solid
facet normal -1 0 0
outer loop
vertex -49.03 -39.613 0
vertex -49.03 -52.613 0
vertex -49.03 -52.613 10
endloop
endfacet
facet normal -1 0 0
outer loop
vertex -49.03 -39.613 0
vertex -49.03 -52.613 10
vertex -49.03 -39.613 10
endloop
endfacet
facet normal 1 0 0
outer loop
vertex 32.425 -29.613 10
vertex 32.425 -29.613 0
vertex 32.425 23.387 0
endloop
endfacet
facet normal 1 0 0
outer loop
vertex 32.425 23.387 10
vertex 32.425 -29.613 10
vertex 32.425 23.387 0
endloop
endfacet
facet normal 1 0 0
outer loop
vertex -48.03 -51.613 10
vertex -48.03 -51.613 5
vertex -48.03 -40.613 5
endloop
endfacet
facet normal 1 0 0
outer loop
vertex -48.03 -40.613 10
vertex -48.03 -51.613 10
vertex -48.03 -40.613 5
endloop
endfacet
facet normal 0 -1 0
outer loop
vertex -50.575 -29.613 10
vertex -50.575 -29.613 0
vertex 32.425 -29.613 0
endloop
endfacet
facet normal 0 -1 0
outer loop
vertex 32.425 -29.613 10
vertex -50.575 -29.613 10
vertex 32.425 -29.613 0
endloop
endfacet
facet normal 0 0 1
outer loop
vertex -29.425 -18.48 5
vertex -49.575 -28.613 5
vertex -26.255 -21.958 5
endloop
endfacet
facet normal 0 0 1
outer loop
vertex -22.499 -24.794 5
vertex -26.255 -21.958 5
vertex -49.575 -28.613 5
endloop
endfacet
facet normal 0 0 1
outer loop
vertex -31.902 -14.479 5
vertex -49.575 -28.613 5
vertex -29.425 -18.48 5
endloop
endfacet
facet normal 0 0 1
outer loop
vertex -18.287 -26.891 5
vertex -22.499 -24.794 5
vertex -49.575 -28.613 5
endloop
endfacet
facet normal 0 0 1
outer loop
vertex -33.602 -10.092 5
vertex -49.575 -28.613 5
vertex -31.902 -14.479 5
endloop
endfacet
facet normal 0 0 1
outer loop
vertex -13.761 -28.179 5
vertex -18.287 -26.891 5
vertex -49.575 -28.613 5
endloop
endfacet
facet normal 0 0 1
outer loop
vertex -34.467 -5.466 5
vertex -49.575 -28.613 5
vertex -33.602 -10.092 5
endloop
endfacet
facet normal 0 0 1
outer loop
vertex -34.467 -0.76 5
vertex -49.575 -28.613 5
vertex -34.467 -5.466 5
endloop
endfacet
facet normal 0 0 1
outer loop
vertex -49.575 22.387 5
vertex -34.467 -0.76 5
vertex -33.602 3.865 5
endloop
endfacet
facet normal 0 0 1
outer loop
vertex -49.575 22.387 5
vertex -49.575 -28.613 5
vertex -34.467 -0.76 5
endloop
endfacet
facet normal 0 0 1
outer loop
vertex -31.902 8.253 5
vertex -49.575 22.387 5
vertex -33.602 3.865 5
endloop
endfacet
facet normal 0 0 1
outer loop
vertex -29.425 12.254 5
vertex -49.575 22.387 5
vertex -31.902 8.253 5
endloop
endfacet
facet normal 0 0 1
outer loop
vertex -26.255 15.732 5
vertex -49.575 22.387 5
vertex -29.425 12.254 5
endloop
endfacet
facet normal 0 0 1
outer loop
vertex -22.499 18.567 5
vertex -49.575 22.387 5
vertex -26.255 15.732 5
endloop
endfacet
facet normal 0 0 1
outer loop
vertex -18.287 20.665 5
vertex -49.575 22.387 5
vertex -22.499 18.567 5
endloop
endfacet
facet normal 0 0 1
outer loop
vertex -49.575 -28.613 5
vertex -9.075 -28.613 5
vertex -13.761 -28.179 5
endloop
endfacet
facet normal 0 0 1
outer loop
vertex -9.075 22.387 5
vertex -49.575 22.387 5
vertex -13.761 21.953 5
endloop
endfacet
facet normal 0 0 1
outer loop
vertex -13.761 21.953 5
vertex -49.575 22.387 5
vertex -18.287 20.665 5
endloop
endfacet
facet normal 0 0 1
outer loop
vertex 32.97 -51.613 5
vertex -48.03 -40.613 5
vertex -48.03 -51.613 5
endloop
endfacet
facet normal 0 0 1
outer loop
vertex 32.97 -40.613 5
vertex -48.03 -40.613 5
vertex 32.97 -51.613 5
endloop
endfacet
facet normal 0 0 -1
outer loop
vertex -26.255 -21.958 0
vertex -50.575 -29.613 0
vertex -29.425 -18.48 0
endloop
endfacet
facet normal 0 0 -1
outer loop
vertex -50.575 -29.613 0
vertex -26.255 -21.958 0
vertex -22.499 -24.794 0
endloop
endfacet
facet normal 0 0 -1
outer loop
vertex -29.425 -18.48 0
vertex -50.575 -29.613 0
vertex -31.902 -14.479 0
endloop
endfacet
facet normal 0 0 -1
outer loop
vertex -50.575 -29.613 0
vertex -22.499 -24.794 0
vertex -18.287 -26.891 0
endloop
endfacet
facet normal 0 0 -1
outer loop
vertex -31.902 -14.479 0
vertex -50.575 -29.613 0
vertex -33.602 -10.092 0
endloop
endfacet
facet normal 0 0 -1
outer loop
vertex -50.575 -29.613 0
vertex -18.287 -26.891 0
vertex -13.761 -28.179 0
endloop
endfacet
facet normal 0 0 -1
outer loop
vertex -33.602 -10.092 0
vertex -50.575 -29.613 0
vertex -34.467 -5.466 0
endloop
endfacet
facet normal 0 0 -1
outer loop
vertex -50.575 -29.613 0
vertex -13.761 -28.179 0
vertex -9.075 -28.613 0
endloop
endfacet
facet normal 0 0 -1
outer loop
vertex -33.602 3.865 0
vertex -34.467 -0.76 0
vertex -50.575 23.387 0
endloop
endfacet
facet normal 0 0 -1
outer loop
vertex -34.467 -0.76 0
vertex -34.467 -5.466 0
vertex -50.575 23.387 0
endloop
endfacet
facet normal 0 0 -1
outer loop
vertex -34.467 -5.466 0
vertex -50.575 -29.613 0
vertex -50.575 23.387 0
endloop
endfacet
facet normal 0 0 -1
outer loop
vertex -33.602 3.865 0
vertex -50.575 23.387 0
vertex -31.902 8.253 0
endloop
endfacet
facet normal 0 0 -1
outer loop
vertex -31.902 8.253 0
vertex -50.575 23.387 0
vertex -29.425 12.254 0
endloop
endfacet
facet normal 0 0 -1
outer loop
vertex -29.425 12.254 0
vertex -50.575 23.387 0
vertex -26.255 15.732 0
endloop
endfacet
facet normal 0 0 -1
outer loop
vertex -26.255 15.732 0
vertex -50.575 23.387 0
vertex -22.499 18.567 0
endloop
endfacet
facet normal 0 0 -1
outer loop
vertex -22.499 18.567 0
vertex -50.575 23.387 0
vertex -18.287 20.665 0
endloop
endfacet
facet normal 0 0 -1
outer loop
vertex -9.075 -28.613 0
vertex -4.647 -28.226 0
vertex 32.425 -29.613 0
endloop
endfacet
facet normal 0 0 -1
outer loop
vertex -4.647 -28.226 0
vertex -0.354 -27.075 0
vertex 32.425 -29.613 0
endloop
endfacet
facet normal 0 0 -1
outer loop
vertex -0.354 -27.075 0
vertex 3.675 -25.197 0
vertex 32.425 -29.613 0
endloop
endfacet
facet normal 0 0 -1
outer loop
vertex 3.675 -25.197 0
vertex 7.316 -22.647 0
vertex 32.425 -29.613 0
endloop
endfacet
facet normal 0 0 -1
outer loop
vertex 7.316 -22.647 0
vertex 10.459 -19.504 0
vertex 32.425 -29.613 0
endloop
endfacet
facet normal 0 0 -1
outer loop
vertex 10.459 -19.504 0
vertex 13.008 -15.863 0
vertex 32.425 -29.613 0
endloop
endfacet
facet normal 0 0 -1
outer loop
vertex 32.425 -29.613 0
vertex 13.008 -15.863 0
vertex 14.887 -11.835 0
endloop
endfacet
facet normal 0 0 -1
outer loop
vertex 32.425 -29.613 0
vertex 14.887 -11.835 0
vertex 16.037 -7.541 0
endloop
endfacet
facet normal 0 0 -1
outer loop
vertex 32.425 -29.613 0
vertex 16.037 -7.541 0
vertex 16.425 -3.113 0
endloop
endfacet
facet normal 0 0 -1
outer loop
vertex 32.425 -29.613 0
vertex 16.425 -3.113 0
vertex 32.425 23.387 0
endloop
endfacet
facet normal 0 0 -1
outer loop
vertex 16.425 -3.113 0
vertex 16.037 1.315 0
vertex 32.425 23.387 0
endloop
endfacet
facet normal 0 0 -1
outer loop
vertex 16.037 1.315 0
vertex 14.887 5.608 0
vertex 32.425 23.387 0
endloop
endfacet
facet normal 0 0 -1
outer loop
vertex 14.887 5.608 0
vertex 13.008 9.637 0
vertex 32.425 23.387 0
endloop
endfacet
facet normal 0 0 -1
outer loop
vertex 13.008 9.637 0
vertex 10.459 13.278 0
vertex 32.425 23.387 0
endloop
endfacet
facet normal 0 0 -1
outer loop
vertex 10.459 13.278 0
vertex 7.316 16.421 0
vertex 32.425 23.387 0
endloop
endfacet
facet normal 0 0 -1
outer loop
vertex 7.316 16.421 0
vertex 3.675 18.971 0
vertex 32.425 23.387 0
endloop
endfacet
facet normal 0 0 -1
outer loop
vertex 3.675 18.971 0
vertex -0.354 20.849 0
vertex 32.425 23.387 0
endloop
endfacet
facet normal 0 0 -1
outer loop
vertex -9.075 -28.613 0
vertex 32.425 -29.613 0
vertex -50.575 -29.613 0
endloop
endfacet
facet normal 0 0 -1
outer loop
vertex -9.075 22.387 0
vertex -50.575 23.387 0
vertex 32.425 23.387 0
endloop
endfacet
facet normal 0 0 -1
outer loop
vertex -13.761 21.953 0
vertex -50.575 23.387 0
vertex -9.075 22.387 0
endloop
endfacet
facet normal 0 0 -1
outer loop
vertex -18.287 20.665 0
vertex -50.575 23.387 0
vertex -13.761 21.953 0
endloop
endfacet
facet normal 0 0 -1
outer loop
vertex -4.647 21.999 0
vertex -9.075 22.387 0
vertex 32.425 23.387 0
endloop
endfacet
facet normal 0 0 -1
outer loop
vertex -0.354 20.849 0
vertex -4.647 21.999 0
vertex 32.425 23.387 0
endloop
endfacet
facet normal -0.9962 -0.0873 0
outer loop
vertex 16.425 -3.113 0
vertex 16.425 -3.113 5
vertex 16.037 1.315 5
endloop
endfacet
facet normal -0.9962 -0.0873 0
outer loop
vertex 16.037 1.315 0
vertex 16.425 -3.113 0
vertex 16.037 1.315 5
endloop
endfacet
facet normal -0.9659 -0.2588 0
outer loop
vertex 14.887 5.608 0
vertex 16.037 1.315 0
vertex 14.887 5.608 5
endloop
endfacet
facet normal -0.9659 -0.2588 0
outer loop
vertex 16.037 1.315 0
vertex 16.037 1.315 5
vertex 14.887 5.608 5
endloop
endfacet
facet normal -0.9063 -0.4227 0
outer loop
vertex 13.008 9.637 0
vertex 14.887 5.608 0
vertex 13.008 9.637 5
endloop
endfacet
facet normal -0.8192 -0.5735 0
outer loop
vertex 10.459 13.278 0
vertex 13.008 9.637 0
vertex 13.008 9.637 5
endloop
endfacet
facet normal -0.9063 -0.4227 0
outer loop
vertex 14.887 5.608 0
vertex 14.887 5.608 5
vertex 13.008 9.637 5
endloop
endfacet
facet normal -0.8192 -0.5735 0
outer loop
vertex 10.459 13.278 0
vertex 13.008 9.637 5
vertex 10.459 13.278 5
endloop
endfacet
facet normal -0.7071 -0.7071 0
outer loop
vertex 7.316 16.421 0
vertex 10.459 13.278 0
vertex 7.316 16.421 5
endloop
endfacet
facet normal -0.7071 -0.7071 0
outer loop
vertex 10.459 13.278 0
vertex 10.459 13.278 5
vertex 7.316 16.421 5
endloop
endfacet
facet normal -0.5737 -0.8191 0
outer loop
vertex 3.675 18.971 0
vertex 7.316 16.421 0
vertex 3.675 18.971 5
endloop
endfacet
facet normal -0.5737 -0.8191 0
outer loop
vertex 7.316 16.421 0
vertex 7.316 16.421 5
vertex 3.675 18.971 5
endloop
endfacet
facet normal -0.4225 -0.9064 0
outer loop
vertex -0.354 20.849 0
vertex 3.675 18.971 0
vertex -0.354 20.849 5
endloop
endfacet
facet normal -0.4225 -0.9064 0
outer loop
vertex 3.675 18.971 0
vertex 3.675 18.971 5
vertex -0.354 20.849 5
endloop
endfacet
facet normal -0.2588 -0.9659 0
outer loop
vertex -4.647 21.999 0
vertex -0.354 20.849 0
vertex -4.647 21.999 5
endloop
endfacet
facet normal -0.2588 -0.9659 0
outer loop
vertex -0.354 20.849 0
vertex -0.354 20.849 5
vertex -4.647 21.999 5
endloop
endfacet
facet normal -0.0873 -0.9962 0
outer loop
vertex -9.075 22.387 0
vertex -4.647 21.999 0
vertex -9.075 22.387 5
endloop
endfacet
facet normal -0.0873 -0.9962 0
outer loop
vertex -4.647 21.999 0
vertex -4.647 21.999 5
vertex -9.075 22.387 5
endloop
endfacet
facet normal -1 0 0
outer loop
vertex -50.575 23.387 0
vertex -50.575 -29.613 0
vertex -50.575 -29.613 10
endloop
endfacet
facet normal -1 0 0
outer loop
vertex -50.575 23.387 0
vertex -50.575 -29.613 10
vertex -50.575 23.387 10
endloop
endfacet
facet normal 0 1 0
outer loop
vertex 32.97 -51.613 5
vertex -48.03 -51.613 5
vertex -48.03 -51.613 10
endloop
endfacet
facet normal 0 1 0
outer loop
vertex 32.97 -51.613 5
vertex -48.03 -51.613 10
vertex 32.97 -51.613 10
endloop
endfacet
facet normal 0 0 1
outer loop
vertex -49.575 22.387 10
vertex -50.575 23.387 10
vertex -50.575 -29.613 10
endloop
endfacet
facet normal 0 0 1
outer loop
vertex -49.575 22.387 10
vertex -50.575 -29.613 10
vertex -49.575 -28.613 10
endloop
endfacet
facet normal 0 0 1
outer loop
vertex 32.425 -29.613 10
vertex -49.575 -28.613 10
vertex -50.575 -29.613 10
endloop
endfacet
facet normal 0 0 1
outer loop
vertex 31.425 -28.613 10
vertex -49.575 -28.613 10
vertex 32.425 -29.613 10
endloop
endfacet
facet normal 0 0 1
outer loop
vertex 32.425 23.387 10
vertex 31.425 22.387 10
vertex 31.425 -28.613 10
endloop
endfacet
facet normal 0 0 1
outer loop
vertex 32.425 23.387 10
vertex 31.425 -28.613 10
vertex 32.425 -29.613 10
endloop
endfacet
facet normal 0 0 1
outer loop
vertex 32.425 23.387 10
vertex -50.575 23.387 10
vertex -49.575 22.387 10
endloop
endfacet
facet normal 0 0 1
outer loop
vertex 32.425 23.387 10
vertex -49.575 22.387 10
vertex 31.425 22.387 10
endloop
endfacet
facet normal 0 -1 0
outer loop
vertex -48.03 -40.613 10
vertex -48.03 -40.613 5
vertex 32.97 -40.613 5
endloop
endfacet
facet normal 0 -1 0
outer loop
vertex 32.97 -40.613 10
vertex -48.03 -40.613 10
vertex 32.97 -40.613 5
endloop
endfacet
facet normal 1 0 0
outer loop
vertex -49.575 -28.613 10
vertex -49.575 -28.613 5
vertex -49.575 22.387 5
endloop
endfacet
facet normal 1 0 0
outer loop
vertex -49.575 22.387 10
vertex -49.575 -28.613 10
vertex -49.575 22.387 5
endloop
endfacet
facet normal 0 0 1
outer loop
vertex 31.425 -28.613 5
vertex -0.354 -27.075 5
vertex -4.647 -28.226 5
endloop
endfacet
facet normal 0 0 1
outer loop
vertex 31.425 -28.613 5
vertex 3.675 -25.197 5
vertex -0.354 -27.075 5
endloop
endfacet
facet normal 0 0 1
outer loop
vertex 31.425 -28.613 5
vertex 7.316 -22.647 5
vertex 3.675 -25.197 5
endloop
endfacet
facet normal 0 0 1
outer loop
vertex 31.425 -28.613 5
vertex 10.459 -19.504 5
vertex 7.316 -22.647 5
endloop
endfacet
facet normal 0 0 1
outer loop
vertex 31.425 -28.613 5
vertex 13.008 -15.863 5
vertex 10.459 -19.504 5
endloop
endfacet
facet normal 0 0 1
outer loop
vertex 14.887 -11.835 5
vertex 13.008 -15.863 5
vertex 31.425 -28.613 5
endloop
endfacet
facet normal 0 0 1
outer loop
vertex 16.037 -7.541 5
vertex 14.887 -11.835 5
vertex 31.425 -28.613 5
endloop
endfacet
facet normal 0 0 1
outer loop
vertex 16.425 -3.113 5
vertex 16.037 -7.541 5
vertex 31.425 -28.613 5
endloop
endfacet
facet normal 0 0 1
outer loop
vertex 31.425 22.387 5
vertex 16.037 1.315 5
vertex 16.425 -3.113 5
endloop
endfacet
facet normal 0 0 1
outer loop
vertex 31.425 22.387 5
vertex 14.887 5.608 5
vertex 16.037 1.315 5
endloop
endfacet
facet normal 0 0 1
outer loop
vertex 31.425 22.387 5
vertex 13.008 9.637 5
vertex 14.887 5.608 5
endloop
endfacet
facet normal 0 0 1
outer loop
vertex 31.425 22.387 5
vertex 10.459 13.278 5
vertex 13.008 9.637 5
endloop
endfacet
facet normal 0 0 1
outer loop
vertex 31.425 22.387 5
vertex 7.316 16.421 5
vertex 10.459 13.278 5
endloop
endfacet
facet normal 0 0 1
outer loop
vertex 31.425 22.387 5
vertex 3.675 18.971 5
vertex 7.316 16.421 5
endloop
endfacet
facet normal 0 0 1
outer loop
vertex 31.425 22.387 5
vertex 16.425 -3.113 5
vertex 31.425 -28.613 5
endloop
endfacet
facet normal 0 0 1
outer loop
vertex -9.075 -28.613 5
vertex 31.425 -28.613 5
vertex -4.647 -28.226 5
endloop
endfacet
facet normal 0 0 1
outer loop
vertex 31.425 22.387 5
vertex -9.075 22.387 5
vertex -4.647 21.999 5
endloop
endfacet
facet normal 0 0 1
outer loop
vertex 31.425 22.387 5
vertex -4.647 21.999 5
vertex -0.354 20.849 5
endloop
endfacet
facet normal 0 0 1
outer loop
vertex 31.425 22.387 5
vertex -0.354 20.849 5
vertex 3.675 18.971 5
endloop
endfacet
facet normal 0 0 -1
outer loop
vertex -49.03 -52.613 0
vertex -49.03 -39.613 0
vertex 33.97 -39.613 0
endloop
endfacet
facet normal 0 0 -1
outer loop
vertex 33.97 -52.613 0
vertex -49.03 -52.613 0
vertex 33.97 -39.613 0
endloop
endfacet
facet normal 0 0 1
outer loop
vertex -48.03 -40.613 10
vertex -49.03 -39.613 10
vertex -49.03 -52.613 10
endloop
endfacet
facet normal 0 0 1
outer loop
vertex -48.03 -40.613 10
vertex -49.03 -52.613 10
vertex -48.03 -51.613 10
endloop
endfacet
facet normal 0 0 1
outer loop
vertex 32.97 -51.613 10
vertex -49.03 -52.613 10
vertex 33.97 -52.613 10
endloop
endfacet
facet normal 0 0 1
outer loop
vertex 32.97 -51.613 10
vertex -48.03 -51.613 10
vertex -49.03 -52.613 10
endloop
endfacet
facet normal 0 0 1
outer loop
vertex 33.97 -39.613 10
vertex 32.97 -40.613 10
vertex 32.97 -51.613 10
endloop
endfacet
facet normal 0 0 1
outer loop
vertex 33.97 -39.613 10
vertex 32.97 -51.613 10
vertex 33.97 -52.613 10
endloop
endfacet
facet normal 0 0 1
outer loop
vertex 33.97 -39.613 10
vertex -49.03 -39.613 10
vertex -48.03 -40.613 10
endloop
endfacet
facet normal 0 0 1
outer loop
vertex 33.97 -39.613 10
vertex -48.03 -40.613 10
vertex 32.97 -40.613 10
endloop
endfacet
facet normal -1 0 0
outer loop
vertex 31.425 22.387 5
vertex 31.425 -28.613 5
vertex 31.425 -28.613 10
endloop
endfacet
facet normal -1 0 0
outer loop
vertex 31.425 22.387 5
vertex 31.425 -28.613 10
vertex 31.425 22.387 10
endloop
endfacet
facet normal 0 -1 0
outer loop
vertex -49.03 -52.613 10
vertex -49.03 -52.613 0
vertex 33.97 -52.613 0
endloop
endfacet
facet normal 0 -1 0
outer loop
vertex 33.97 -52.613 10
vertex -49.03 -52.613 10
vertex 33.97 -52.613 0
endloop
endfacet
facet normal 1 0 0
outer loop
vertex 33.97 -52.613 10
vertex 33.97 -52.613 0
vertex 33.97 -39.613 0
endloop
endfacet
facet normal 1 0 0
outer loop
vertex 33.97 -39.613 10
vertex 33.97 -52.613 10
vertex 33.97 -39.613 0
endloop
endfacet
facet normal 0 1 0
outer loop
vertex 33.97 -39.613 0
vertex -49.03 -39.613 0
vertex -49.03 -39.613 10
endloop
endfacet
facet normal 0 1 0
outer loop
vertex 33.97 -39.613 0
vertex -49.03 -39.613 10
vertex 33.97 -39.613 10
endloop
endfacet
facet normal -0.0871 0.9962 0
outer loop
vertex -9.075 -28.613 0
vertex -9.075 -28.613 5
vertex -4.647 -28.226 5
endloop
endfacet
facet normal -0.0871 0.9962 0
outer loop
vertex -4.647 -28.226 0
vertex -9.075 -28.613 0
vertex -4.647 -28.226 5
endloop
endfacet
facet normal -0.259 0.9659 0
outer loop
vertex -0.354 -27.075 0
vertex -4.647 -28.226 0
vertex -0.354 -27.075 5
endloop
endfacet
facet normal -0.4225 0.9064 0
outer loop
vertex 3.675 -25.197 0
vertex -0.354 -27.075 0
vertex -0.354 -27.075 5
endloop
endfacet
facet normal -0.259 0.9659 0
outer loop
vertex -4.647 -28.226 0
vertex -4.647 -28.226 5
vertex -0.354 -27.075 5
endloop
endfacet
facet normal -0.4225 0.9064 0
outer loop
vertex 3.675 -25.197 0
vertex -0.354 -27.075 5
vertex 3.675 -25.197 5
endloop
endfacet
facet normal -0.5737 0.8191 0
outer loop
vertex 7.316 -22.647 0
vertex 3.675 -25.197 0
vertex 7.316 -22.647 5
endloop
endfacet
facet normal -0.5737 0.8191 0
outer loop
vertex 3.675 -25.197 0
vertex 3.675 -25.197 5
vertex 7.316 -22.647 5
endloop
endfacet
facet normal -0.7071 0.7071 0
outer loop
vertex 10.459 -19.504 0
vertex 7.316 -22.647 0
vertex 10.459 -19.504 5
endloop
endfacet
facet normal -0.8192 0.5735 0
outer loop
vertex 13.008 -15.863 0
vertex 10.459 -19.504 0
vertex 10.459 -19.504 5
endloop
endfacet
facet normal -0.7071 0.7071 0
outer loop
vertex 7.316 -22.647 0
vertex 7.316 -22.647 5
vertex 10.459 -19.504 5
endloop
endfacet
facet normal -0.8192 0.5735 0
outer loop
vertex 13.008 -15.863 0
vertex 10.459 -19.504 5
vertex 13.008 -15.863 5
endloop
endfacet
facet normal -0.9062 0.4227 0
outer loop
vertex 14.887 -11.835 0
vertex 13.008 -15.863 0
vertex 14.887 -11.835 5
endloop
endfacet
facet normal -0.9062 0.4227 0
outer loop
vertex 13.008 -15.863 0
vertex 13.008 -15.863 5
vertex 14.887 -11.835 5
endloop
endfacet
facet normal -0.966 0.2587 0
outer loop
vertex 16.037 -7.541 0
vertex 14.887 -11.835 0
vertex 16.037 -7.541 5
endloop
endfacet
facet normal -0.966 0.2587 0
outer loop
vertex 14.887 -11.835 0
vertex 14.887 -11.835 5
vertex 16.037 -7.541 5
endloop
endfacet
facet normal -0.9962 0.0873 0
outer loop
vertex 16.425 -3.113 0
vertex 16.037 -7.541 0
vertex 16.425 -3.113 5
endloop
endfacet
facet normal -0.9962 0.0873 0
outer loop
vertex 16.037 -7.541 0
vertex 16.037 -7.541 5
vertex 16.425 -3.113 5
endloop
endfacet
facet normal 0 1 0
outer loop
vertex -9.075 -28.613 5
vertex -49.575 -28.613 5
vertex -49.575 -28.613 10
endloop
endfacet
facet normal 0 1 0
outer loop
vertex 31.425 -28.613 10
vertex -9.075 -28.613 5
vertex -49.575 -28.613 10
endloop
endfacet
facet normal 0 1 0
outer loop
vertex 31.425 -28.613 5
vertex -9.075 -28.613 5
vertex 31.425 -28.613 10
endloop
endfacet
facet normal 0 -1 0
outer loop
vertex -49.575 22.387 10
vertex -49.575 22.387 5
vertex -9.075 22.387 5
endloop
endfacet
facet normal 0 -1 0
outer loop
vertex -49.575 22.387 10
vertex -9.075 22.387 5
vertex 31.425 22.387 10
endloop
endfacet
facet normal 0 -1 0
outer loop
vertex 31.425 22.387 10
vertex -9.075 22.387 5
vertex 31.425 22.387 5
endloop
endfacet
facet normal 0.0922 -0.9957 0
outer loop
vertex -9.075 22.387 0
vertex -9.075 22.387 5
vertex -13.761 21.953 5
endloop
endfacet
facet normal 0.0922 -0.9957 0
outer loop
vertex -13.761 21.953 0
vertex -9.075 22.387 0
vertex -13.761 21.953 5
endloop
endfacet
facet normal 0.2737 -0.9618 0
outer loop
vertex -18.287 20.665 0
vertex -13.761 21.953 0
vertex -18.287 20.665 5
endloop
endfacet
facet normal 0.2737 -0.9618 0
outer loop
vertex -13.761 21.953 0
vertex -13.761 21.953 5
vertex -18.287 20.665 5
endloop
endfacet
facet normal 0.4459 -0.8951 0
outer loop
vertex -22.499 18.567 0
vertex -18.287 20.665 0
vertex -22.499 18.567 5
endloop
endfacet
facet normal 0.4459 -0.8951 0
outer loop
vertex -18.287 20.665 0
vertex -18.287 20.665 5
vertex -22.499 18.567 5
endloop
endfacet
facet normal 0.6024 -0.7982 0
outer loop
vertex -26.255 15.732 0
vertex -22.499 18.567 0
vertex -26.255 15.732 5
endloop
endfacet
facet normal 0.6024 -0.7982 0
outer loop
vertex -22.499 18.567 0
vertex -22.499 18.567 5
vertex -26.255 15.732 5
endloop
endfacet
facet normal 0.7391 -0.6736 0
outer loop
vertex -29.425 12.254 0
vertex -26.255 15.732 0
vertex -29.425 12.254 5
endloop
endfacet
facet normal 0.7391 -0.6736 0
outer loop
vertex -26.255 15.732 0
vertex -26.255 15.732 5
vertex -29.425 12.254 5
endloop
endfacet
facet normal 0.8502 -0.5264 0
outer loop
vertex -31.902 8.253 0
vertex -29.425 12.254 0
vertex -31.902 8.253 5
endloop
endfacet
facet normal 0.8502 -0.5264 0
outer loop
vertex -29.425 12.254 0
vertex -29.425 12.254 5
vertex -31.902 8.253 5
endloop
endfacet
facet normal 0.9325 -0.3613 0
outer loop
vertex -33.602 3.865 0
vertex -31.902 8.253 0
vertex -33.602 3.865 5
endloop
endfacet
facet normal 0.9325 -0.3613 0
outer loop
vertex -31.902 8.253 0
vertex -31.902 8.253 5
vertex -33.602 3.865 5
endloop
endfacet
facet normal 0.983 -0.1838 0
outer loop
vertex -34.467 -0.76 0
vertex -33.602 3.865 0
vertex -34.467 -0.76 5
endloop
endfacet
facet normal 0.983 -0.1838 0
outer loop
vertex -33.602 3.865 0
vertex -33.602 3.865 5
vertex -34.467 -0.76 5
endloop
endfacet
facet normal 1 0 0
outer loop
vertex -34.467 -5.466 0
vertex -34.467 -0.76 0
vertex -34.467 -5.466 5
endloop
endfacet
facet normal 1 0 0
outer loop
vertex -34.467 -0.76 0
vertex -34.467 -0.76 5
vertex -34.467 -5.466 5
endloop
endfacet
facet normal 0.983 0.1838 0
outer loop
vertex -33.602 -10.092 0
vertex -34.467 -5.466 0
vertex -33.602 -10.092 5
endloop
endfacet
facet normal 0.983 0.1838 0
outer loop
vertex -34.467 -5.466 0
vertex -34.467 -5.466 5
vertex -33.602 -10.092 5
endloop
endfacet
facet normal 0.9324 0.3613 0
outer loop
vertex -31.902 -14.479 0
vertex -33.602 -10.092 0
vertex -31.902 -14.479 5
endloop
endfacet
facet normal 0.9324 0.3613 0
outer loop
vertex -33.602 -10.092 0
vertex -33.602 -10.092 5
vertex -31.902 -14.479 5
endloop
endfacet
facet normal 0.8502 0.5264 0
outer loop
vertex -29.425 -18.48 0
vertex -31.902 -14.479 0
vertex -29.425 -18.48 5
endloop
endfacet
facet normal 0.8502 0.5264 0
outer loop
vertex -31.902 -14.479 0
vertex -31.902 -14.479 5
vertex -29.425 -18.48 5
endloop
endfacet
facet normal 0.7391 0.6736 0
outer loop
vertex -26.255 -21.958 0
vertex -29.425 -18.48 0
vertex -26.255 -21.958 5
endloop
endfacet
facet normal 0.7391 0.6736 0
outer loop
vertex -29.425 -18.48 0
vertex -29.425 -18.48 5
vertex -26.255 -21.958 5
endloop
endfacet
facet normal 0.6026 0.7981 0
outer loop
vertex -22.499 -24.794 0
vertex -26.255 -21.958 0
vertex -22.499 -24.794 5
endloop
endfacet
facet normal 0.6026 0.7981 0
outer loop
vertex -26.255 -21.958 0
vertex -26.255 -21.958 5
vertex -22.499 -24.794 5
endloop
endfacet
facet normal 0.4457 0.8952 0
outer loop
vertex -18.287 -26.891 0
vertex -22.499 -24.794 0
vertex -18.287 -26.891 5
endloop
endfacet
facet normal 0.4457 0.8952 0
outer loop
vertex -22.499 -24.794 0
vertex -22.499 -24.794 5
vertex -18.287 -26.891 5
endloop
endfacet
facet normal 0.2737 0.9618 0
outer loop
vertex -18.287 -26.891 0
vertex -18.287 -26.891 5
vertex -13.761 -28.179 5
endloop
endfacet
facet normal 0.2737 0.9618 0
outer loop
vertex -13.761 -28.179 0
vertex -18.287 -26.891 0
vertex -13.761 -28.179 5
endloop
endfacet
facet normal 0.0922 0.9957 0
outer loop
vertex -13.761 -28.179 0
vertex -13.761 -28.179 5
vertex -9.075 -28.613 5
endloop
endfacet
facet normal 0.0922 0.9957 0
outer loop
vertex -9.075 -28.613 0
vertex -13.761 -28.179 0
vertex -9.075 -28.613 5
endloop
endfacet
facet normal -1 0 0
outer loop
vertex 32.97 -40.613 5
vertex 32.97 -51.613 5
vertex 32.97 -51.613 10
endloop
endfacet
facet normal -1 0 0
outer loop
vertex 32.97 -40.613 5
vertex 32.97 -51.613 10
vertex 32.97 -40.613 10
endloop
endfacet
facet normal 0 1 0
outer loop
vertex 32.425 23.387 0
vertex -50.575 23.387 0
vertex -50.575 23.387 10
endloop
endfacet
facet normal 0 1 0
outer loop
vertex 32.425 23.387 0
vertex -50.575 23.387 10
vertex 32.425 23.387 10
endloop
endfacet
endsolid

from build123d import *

# Parameters (mm, degrees)
F0_W     = 83
F0_H     = 53
F0_W_2   = 81
F0_H_2   = 51
F1_DEPTH = 10
F2_DEPTH = 5
F3_W     = 81
F3_H     = 11
F4_DEPTH = 5
F3_W_2   = 83
F3_H_2   = 13
F5_DEPTH = 10
F7_DEPTH = 25


with BuildPart() as f1:
    # F0 (on Top) → F1 (new body)
    with BuildSketch(Plane.XY):
        with Locations((-9.075372, -3.113147)):
            Rectangle(F0_W, F0_H)
        with Locations((-9.075372, -3.113147)):
            Rectangle(F0_W_2, F0_H_2, mode=Mode.SUBTRACT)
    extrude(amount=F1_DEPTH)

    # F0 (on Top) → F2 (join)
    with BuildSketch(Plane.XY):
        with Locations((-9.075372, -3.113147)):
            Rectangle(F0_W_2, F0_H_2)
    extrude(amount=F2_DEPTH)

    # F6 (on face) → F7 (cut)
    with BuildSketch(Plane.XY.offset(5)):
        with BuildLine():
            ThreePointArc((-9.075372, -28.613147), (8.955851, -21.144369), (16.424628, -3.113147))
            ThreePointArc((16.424628, -3.113147), (8.955851, 14.918076), (-9.075372, 22.386853))
            ThreePointArc((-9.075372, 22.386853), (-34.575372, -3.113147), (-9.075372, -28.613147))
        make_face()
    extrude(amount=-F7_DEPTH, mode=Mode.SUBTRACT)


with BuildPart() as f4:
    # F3 (on Top) → F4 (new body)
    with BuildSketch(Plane.XY):
        with Locations((-7.530028, -46.113147)):
            Rectangle(F3_W, F3_H)
    extrude(amount=F4_DEPTH)

    # F3 (on Top) → F5 (join)
    with BuildSketch(Plane.XY):
        with Locations((-7.530028, -46.113147)):
            Rectangle(F3_W_2, F3_H_2)
        with Locations((-7.530028, -46.113147)):
            Rectangle(F3_W, F3_H, mode=Mode.SUBTRACT)
    extrude(amount=F5_DEPTH)


solid = Compound([f1.part, f4.part])
